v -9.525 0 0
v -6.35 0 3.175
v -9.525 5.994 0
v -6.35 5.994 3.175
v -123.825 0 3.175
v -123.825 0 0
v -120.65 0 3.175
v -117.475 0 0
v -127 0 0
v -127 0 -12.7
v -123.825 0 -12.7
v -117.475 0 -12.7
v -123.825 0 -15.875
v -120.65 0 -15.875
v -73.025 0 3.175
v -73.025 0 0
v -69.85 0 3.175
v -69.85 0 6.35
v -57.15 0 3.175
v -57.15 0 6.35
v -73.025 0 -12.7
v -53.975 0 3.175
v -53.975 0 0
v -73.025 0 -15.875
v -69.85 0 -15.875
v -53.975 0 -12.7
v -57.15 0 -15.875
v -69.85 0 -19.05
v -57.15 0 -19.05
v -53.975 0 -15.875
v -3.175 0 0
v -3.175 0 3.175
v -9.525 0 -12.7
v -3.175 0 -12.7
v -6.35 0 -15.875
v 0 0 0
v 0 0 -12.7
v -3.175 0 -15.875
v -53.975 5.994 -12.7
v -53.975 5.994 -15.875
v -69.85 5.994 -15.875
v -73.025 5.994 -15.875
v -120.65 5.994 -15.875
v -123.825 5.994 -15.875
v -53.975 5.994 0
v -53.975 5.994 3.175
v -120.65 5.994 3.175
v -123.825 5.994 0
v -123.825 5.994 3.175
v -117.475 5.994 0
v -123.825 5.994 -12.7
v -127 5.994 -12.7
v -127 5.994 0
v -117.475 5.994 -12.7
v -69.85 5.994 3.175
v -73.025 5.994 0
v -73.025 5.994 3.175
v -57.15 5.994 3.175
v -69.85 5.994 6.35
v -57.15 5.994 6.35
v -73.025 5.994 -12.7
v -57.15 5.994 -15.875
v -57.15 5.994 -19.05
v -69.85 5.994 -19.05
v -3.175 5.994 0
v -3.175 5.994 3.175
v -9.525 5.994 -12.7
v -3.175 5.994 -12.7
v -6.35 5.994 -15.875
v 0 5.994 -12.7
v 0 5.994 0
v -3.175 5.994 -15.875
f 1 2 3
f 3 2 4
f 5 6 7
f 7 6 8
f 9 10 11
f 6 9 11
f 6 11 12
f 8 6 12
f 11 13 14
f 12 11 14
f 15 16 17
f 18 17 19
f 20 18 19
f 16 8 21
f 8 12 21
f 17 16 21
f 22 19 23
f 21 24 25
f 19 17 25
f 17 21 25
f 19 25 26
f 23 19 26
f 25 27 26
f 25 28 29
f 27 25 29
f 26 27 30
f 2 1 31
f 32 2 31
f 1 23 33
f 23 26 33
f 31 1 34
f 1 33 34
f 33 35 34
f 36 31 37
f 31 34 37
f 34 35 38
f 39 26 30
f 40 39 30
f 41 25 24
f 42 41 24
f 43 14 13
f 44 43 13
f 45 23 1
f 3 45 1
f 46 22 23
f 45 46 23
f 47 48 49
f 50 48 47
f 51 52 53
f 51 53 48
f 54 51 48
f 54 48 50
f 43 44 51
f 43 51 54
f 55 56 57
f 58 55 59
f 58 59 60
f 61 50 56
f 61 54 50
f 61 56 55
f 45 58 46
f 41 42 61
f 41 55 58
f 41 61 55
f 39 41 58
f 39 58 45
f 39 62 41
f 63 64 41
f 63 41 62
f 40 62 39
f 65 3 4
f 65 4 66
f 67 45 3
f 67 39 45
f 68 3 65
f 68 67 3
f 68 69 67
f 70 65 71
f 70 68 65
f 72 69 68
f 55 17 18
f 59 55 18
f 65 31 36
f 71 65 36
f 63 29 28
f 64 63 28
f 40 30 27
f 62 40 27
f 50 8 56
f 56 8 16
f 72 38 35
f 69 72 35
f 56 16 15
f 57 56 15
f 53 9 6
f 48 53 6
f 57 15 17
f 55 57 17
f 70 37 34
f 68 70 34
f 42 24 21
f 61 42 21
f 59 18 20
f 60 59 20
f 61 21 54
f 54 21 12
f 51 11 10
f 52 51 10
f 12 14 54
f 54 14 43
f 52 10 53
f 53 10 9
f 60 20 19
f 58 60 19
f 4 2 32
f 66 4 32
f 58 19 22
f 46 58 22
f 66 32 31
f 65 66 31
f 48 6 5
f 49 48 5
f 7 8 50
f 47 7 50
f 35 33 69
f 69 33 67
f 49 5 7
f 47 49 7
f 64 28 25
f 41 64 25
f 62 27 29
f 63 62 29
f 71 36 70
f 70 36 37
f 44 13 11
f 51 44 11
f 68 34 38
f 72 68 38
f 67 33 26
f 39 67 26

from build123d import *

# Parameters (mm, degrees)
BOSS_EXTRUDE1_DEPTH = 5.9944
CHAMFER1_SIZE       = 3.175


with BuildPart() as part:
    # Sketch1 → Boss-Extrude1 (new body)
    with BuildSketch(Plane(origin=(0, 0, 0), x_dir=(1, 0, 0), z_dir=(0, 1, 0))):
        Polygon((-53.975, 0), (-6.35, 0), (-6.35, -3.175), (-3.175, -3.175), (-3.175, 0), (0, 0), (0, 12.7), (-3.175, 12.7), (-3.175, 15.875), (-6.35, 15.875), (-6.35, 12.7), (-53.975, 12.7), (-53.975, 15.875), (-57.15, 15.875), (-57.15, 19.05), (-69.85, 19.05), (-69.85, 15.875), (-73.025, 15.875), (-73.025, 12.7), (-120.65, 12.7), (-120.65, 15.875), (-123.825, 15.875), (-123.825, 12.7), (-127, 12.7), (-127, 0), (-123.825, 0), (-123.825, -3.175), (-120.65, -3.175), (-120.65, 0), (-73.025, 0), (-73.025, -3.175), (-69.85, -3.175), (-69.85, -6.35), (-57.15, -6.35), (-57.15, -3.175), (-53.975, -3.175), align=None)
    extrude(amount=BOSS_EXTRUDE1_DEPTH)

    # Chamfer1
    chamfer1_edges = [part.edges().sort_by_distance(p)[0] for p in [
        (-6.35, 2.9972, -12.7),
        (-6.35, 2.9972, 0),
        (-120.65, 2.9972, 0),
        (-120.65, 2.9972, -12.7),
    ]]
    chamfer(chamfer1_edges, length=CHAMFER1_SIZE - 0.0001)  # a hair under: the kernel refuses the full size


solid = part.part
